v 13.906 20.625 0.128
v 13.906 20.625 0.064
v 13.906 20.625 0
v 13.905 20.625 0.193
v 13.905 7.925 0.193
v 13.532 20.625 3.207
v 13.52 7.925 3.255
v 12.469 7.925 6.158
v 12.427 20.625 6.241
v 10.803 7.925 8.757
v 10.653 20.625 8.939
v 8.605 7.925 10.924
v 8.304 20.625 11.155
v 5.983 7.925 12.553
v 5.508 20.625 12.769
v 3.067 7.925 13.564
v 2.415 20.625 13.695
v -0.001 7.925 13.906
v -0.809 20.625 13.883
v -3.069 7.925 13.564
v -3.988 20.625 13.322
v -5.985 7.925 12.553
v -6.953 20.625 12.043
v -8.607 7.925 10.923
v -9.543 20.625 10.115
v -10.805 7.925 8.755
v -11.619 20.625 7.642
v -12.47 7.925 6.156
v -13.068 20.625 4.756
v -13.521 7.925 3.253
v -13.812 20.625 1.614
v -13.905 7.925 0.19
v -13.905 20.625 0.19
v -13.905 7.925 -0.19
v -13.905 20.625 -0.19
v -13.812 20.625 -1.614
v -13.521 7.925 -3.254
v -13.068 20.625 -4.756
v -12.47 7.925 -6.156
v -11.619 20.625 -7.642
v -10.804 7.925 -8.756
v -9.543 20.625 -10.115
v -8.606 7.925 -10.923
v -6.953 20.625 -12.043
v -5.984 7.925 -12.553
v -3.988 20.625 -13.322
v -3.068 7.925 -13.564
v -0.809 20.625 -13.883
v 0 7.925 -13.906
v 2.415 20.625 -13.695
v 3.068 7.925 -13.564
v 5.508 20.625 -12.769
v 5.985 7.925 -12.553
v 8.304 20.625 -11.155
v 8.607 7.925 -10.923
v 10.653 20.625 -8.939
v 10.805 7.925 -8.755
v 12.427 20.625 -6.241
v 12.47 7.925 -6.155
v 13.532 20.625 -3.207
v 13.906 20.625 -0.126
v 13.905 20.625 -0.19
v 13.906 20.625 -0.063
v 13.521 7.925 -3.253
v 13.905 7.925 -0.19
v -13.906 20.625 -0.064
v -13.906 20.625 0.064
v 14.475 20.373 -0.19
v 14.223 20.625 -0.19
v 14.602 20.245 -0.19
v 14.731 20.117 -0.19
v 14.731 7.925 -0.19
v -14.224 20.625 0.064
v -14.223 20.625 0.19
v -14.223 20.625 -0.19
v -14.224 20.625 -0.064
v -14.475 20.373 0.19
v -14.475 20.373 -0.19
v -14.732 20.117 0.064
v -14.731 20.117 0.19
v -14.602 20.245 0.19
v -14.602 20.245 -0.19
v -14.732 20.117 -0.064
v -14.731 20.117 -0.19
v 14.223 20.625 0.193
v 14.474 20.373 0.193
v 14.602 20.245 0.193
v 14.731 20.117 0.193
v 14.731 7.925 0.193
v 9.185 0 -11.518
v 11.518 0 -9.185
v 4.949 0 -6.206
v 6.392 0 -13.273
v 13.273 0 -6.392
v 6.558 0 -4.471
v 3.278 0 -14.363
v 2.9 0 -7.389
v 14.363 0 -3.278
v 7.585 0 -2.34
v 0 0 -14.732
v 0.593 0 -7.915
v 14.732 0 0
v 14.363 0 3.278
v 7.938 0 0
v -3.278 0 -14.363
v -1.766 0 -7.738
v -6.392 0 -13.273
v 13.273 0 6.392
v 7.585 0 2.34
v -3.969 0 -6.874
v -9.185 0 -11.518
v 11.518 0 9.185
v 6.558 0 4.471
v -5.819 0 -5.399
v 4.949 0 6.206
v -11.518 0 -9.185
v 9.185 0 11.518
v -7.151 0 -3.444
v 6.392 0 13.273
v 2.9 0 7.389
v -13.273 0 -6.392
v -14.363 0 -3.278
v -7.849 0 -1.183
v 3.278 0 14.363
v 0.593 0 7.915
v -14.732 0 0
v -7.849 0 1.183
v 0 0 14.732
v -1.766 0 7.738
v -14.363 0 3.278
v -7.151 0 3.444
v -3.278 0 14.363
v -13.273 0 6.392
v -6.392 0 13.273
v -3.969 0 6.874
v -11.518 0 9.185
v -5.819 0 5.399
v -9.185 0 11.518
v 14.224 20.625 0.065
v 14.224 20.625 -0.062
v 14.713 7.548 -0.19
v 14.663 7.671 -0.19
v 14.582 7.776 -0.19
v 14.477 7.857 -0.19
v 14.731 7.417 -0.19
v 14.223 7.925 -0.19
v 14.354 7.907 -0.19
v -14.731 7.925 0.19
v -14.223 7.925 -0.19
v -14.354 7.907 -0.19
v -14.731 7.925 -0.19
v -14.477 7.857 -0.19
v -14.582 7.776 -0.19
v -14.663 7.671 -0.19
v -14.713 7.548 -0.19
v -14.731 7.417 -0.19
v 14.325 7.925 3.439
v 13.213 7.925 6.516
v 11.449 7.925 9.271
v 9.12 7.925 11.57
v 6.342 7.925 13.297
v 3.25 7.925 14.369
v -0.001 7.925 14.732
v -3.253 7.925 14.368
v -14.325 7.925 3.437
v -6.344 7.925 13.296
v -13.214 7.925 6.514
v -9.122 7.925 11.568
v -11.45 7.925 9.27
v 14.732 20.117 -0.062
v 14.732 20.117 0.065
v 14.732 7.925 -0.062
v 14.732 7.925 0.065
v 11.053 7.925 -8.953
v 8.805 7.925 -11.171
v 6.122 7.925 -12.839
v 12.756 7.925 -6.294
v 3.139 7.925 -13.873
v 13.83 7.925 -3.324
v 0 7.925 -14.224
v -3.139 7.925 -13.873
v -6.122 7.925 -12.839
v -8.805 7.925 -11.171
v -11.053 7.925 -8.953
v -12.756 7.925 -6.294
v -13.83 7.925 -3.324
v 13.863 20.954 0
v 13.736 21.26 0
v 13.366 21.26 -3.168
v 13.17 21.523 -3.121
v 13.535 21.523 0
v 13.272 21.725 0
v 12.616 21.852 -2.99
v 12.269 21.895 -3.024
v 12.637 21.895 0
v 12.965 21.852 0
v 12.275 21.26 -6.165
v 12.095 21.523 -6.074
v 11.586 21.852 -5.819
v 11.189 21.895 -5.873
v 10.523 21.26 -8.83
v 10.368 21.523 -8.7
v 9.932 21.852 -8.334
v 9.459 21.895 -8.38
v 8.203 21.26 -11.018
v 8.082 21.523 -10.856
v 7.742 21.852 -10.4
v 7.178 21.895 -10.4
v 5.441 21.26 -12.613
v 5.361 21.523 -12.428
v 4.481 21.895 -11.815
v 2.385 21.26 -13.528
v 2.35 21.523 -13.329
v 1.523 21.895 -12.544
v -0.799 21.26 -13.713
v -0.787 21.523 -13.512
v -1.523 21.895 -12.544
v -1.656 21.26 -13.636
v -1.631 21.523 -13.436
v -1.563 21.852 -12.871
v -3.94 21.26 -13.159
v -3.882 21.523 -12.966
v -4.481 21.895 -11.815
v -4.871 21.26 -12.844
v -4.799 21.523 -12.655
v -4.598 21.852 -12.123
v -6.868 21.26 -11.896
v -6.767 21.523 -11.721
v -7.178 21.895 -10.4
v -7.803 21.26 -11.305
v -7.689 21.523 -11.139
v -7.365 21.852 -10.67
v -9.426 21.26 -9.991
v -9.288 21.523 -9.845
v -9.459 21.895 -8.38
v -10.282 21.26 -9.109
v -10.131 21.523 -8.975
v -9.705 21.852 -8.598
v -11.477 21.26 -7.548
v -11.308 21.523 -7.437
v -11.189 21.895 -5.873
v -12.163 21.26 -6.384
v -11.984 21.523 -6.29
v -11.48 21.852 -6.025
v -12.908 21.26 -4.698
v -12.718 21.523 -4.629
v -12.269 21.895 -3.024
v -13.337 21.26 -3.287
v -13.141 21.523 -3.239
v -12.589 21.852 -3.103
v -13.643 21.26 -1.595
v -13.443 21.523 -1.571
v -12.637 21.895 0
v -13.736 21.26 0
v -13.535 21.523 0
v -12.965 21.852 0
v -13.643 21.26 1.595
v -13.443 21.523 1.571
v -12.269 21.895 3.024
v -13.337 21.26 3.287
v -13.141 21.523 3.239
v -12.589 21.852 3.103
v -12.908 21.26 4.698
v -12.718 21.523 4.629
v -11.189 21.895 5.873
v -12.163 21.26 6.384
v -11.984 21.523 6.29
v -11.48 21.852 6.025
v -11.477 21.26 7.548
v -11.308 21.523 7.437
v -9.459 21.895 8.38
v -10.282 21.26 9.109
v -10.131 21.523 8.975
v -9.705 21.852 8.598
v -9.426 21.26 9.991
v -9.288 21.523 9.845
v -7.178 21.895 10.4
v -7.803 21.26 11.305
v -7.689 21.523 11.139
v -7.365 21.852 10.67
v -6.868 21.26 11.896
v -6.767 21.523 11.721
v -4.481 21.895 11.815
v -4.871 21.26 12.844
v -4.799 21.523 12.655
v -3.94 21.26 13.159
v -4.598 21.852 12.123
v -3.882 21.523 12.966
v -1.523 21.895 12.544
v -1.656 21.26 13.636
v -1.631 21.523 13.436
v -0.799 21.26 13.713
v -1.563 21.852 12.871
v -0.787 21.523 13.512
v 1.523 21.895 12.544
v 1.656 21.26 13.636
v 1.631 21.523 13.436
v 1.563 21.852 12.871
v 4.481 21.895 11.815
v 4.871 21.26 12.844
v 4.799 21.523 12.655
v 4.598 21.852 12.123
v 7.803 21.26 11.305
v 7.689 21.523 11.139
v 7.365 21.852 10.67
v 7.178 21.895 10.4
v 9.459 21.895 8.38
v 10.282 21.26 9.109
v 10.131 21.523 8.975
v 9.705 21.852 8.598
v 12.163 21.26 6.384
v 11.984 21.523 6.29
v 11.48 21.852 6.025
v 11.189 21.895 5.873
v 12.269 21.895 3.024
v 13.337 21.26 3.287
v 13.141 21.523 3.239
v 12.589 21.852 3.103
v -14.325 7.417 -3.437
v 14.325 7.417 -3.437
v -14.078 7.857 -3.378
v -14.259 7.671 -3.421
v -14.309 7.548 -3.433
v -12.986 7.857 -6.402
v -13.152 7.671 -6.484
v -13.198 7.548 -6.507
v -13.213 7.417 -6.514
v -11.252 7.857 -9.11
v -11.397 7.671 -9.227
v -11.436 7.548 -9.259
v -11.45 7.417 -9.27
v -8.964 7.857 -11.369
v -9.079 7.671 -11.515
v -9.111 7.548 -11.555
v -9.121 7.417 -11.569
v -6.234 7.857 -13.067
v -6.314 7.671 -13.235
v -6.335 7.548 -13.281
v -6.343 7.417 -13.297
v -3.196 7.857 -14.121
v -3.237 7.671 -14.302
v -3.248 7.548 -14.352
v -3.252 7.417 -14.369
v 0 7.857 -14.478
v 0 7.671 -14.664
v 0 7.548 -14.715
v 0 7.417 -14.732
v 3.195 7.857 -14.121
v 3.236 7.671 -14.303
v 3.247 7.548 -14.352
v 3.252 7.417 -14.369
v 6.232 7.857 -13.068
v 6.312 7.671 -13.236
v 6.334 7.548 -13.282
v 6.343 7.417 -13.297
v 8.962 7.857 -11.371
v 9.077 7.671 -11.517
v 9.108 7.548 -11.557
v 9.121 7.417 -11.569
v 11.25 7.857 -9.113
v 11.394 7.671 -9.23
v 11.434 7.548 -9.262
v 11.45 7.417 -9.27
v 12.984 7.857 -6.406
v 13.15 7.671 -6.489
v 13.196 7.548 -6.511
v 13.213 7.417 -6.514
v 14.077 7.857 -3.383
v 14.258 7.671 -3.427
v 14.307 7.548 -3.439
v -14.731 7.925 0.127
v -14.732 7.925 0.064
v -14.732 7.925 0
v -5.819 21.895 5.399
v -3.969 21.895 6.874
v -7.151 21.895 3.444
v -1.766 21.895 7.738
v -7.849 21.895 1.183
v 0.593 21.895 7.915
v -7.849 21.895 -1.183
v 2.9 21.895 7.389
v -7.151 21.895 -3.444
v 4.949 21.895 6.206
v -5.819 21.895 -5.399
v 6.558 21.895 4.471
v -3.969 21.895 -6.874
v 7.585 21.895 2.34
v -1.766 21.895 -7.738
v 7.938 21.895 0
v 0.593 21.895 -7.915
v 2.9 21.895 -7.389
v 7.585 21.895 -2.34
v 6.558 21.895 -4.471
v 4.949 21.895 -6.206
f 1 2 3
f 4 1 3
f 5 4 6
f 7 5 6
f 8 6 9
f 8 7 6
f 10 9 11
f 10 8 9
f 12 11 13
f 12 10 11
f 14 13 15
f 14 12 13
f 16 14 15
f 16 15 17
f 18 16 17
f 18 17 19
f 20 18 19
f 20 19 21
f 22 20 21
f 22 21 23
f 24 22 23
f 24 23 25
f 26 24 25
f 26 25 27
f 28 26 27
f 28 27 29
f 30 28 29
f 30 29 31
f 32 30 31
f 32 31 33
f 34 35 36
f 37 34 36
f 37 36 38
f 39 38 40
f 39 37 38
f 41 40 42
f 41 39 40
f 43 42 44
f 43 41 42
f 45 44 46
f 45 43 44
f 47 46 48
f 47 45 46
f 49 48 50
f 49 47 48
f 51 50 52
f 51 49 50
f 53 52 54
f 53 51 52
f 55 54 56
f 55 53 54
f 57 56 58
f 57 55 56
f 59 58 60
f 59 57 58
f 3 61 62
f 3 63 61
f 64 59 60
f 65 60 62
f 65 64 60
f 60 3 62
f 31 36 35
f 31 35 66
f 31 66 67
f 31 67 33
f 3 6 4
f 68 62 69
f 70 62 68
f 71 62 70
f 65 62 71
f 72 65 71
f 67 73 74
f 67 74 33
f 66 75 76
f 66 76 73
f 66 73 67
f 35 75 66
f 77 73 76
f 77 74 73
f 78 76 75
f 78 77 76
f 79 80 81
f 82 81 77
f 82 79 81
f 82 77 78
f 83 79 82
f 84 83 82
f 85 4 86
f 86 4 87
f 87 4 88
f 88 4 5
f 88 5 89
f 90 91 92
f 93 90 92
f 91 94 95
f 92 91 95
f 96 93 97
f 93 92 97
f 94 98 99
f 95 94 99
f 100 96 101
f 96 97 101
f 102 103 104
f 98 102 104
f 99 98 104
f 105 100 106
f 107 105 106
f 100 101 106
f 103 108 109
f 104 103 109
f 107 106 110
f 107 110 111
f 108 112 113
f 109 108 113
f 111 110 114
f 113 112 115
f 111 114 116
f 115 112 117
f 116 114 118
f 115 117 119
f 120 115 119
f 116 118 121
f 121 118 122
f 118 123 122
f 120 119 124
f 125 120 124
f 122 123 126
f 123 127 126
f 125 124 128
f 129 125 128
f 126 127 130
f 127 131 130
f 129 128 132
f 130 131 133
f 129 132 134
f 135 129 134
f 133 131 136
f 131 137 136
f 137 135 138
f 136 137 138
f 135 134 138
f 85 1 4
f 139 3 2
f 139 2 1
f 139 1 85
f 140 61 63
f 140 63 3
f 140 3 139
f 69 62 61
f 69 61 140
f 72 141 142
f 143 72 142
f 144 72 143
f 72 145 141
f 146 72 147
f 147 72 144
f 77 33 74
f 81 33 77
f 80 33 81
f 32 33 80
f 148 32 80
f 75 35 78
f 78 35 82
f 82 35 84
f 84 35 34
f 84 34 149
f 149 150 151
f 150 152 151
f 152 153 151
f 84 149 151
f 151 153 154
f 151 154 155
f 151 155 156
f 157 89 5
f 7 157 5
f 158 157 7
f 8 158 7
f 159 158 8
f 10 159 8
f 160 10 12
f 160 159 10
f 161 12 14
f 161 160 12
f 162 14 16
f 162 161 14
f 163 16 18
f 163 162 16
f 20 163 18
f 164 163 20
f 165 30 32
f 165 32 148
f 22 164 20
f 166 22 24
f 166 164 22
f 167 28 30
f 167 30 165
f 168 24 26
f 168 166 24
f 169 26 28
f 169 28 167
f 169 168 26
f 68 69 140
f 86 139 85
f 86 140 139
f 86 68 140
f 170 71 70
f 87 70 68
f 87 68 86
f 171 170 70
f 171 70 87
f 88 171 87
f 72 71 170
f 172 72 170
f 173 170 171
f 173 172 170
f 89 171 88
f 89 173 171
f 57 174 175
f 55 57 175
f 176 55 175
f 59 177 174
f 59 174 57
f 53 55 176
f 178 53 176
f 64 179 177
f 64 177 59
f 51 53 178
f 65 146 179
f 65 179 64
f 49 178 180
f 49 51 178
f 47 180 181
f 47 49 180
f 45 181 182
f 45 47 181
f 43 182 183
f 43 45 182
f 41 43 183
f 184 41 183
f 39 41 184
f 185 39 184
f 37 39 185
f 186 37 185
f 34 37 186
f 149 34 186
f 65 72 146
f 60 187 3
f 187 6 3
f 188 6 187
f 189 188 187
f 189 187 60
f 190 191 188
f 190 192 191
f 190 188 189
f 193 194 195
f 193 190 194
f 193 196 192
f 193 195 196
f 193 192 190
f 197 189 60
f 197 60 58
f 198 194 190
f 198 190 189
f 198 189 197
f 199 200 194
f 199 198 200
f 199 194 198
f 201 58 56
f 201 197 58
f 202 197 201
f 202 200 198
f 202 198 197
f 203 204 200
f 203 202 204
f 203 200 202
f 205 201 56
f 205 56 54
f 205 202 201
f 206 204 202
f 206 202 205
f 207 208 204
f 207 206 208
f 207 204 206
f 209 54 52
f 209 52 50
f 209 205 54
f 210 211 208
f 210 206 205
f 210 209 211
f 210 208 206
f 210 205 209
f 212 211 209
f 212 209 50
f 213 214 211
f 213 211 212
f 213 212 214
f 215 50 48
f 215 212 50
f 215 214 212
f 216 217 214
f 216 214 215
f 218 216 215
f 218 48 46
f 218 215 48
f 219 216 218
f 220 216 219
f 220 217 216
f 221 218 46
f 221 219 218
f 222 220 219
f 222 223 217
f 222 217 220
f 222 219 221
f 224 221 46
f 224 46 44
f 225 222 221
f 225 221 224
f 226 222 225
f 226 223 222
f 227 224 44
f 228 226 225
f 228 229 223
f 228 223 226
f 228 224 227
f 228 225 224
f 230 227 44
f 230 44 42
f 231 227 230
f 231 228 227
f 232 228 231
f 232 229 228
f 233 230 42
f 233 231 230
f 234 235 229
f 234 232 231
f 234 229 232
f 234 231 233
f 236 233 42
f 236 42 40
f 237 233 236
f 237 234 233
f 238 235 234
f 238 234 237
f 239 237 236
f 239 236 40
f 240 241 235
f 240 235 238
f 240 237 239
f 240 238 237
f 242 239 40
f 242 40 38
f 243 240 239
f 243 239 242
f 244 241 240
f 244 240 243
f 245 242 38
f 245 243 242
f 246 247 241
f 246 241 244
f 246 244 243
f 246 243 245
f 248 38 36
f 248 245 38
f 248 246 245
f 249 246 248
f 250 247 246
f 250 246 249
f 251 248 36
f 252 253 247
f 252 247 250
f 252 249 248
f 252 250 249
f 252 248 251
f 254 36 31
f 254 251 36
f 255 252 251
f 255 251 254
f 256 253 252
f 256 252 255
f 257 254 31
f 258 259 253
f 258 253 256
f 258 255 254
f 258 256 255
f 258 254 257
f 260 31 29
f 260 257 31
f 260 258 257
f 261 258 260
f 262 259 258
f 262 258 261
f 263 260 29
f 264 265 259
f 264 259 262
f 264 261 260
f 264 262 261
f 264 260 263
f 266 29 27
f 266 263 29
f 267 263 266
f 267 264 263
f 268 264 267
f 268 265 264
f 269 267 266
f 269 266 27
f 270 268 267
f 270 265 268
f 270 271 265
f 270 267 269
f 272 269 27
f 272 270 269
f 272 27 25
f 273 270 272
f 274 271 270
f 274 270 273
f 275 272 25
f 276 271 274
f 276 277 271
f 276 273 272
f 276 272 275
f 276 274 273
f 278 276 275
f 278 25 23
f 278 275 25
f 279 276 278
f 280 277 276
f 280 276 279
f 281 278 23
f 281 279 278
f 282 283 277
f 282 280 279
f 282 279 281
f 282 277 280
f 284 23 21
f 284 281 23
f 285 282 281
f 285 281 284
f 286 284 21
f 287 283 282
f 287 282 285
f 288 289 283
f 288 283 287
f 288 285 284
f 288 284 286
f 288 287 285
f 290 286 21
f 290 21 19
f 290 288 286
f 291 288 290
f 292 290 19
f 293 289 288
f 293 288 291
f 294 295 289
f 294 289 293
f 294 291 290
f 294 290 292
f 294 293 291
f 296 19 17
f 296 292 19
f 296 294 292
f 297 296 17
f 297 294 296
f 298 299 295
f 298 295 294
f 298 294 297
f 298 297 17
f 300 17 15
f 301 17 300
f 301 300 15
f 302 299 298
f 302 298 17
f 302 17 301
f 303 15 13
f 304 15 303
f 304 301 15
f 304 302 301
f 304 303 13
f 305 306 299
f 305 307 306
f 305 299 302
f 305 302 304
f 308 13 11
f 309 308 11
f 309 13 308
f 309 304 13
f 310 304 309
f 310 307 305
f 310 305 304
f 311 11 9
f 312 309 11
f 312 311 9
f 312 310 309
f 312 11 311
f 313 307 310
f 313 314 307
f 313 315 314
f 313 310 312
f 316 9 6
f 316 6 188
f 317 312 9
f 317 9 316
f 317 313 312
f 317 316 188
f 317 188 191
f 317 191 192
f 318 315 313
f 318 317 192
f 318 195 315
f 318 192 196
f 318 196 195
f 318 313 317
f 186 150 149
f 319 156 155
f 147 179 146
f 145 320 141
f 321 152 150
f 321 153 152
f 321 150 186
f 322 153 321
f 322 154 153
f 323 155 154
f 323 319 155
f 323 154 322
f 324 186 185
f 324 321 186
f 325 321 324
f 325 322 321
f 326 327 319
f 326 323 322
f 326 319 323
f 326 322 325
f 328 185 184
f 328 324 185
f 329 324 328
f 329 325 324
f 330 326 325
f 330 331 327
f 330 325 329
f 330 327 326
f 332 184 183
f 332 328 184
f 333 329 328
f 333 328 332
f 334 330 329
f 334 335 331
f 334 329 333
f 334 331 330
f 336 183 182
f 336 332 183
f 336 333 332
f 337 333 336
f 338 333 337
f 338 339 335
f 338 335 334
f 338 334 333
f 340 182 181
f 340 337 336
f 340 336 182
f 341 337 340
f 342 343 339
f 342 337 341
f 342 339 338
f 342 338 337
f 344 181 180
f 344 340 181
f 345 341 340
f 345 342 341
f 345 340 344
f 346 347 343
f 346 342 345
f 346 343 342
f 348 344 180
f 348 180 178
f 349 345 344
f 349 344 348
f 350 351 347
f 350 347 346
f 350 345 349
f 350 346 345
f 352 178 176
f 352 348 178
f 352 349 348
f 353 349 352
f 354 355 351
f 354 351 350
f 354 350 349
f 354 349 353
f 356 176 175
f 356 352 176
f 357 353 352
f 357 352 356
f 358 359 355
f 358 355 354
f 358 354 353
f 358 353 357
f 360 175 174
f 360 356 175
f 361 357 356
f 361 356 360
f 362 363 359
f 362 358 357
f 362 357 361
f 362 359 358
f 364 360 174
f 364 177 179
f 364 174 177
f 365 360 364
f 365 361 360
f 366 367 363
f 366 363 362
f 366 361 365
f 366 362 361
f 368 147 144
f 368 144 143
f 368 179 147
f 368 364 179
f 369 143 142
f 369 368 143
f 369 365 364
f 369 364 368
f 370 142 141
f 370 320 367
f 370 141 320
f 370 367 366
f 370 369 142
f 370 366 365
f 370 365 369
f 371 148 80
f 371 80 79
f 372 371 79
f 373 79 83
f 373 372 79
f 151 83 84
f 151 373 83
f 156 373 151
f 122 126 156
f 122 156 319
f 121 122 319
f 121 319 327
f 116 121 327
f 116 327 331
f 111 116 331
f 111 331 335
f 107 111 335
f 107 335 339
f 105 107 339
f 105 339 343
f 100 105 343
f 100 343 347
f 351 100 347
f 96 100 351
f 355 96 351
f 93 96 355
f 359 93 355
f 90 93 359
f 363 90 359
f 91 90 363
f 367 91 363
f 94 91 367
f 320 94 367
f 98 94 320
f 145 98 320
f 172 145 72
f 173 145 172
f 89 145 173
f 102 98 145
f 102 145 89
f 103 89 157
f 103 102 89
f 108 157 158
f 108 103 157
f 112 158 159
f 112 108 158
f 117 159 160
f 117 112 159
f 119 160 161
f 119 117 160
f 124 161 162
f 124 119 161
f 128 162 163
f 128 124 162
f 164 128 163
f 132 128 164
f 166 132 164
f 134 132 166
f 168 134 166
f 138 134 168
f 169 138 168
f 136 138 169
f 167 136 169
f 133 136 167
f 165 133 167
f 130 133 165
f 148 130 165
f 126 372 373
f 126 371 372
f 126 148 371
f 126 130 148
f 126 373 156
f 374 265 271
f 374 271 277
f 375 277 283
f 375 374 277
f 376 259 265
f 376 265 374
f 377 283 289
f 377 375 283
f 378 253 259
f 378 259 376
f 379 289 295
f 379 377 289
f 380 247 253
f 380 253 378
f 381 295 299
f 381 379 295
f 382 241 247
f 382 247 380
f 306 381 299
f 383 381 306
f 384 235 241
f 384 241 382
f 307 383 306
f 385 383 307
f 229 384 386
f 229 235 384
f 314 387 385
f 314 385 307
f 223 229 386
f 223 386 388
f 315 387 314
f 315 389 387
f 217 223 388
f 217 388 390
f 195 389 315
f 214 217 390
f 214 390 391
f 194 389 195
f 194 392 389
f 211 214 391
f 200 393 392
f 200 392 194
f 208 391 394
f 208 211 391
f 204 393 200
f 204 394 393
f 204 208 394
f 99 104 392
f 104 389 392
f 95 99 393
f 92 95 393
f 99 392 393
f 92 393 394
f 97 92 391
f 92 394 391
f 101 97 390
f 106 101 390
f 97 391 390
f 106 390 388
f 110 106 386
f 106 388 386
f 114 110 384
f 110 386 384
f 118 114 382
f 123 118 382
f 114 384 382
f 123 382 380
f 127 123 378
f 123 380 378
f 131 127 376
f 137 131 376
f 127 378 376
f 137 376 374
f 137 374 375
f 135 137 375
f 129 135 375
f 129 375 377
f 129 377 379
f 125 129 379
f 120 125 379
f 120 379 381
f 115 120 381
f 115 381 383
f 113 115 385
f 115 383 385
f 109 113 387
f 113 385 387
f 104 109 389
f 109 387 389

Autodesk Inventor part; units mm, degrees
ref_plane "YZ Plane" through (0, 0, 0) normal (1, 0, 0) x (0, 1, 0)
ref_plane "XZ Plane" through (0, 0, 0) normal (0, 1, 0) x (-1, 0, 0)
ref_plane "XY Plane" through (0, 0, 0) normal (0, 0, 1) x (1, 0, 0)
sketch "Sketch1" plane through (0, 0, 0) normal (0, 1, 0) x (-1, 0, 0)
  circle A0 centre (0, 0) radius 14.732
  dimension "d0" = 29.464
extrude "Extrusion1" add sketch "Sketch1" along normal blind 7.9248
sketch "Sketch2" plane through (0, 7.9248, 0) normal (0, 1, 0) x (1, 0, 0)
  circle A0 centre (0, 0) radius 14.732 projected
  circle A1 centre (0, 0) radius 13.9065
  dimension "d3" = 27.813
extrude "Extrusion2" add sketch "Sketch2" along normal blind 13.97 contours A1
sketch "Sketch4" plane through (0, 7.9248, 0) normal (0, 1, 0) x (1, 0, 0)
  circle A0 centre (0, 0) radius 13.9065 projected
  circle A1 centre (0, 0) radius 14.732 projected
  circle A2 centre (0, 0) radius 13.9065
  circle A3 centre (0, 0) radius 14.732
  line L0 (-13.905, 0.2046) -> (-13.0794, 0.2046) construction
  line L1 (-13.9052, 0.1905) -> (-14.7308, 0.1905)
  line L2 (-13.9052, 0.1905) -> (-13.0796, 0.1905) construction
  line L3 (-13.9052, -0.1905) -> (-14.7308, -0.1905)
  line L4 (-13.9052, -0.1905) -> (-13.0796, -0.1905) construction
  line L5 (-13.9052, 0.1905) -> (14.7308, 0.1896)
  line L6 (-13.9052, -0.1905) -> (14.7307, -0.1927)
  dimension "d7" = 180
  dimension "d8" = 180
extrude "Extrusion3" add sketch "Sketch4" along normal blind 12.7 contours L5 A0 L6 | A0 L3 A1 L1 | L5 A1 L6 A0
chamfer "Chamfer1" distance 0.508 angle 45 1 edges at (14.732, 20.6248, 0.0015)
chamfer "Chamfer2" distance 0.508 angle 45 1 edges at (-14.732, 20.6248, 0)
fillet "Fillet1" radius 1.27 1 edges at (-13.9065, 21.8948, 0)
fillet "Fillet2" radius 0.508 1 edges at (0.0004, 7.9248, -14.732)
sketch "Sketch5" plane through (0, 21.8948, 0) normal (0, 1, 0) x (1, 0, 0)
  circle A0 centre (0, 0) radius 12.6365 projected
  circle A1 centre (0, 0) radius 7.9375
  dimension "d19" = 15.875
extrude "Extrusion4" cut sketch "Sketch5" against normal blind 25.4 contours A1
properties part number "Pipe T with a hole in it"
